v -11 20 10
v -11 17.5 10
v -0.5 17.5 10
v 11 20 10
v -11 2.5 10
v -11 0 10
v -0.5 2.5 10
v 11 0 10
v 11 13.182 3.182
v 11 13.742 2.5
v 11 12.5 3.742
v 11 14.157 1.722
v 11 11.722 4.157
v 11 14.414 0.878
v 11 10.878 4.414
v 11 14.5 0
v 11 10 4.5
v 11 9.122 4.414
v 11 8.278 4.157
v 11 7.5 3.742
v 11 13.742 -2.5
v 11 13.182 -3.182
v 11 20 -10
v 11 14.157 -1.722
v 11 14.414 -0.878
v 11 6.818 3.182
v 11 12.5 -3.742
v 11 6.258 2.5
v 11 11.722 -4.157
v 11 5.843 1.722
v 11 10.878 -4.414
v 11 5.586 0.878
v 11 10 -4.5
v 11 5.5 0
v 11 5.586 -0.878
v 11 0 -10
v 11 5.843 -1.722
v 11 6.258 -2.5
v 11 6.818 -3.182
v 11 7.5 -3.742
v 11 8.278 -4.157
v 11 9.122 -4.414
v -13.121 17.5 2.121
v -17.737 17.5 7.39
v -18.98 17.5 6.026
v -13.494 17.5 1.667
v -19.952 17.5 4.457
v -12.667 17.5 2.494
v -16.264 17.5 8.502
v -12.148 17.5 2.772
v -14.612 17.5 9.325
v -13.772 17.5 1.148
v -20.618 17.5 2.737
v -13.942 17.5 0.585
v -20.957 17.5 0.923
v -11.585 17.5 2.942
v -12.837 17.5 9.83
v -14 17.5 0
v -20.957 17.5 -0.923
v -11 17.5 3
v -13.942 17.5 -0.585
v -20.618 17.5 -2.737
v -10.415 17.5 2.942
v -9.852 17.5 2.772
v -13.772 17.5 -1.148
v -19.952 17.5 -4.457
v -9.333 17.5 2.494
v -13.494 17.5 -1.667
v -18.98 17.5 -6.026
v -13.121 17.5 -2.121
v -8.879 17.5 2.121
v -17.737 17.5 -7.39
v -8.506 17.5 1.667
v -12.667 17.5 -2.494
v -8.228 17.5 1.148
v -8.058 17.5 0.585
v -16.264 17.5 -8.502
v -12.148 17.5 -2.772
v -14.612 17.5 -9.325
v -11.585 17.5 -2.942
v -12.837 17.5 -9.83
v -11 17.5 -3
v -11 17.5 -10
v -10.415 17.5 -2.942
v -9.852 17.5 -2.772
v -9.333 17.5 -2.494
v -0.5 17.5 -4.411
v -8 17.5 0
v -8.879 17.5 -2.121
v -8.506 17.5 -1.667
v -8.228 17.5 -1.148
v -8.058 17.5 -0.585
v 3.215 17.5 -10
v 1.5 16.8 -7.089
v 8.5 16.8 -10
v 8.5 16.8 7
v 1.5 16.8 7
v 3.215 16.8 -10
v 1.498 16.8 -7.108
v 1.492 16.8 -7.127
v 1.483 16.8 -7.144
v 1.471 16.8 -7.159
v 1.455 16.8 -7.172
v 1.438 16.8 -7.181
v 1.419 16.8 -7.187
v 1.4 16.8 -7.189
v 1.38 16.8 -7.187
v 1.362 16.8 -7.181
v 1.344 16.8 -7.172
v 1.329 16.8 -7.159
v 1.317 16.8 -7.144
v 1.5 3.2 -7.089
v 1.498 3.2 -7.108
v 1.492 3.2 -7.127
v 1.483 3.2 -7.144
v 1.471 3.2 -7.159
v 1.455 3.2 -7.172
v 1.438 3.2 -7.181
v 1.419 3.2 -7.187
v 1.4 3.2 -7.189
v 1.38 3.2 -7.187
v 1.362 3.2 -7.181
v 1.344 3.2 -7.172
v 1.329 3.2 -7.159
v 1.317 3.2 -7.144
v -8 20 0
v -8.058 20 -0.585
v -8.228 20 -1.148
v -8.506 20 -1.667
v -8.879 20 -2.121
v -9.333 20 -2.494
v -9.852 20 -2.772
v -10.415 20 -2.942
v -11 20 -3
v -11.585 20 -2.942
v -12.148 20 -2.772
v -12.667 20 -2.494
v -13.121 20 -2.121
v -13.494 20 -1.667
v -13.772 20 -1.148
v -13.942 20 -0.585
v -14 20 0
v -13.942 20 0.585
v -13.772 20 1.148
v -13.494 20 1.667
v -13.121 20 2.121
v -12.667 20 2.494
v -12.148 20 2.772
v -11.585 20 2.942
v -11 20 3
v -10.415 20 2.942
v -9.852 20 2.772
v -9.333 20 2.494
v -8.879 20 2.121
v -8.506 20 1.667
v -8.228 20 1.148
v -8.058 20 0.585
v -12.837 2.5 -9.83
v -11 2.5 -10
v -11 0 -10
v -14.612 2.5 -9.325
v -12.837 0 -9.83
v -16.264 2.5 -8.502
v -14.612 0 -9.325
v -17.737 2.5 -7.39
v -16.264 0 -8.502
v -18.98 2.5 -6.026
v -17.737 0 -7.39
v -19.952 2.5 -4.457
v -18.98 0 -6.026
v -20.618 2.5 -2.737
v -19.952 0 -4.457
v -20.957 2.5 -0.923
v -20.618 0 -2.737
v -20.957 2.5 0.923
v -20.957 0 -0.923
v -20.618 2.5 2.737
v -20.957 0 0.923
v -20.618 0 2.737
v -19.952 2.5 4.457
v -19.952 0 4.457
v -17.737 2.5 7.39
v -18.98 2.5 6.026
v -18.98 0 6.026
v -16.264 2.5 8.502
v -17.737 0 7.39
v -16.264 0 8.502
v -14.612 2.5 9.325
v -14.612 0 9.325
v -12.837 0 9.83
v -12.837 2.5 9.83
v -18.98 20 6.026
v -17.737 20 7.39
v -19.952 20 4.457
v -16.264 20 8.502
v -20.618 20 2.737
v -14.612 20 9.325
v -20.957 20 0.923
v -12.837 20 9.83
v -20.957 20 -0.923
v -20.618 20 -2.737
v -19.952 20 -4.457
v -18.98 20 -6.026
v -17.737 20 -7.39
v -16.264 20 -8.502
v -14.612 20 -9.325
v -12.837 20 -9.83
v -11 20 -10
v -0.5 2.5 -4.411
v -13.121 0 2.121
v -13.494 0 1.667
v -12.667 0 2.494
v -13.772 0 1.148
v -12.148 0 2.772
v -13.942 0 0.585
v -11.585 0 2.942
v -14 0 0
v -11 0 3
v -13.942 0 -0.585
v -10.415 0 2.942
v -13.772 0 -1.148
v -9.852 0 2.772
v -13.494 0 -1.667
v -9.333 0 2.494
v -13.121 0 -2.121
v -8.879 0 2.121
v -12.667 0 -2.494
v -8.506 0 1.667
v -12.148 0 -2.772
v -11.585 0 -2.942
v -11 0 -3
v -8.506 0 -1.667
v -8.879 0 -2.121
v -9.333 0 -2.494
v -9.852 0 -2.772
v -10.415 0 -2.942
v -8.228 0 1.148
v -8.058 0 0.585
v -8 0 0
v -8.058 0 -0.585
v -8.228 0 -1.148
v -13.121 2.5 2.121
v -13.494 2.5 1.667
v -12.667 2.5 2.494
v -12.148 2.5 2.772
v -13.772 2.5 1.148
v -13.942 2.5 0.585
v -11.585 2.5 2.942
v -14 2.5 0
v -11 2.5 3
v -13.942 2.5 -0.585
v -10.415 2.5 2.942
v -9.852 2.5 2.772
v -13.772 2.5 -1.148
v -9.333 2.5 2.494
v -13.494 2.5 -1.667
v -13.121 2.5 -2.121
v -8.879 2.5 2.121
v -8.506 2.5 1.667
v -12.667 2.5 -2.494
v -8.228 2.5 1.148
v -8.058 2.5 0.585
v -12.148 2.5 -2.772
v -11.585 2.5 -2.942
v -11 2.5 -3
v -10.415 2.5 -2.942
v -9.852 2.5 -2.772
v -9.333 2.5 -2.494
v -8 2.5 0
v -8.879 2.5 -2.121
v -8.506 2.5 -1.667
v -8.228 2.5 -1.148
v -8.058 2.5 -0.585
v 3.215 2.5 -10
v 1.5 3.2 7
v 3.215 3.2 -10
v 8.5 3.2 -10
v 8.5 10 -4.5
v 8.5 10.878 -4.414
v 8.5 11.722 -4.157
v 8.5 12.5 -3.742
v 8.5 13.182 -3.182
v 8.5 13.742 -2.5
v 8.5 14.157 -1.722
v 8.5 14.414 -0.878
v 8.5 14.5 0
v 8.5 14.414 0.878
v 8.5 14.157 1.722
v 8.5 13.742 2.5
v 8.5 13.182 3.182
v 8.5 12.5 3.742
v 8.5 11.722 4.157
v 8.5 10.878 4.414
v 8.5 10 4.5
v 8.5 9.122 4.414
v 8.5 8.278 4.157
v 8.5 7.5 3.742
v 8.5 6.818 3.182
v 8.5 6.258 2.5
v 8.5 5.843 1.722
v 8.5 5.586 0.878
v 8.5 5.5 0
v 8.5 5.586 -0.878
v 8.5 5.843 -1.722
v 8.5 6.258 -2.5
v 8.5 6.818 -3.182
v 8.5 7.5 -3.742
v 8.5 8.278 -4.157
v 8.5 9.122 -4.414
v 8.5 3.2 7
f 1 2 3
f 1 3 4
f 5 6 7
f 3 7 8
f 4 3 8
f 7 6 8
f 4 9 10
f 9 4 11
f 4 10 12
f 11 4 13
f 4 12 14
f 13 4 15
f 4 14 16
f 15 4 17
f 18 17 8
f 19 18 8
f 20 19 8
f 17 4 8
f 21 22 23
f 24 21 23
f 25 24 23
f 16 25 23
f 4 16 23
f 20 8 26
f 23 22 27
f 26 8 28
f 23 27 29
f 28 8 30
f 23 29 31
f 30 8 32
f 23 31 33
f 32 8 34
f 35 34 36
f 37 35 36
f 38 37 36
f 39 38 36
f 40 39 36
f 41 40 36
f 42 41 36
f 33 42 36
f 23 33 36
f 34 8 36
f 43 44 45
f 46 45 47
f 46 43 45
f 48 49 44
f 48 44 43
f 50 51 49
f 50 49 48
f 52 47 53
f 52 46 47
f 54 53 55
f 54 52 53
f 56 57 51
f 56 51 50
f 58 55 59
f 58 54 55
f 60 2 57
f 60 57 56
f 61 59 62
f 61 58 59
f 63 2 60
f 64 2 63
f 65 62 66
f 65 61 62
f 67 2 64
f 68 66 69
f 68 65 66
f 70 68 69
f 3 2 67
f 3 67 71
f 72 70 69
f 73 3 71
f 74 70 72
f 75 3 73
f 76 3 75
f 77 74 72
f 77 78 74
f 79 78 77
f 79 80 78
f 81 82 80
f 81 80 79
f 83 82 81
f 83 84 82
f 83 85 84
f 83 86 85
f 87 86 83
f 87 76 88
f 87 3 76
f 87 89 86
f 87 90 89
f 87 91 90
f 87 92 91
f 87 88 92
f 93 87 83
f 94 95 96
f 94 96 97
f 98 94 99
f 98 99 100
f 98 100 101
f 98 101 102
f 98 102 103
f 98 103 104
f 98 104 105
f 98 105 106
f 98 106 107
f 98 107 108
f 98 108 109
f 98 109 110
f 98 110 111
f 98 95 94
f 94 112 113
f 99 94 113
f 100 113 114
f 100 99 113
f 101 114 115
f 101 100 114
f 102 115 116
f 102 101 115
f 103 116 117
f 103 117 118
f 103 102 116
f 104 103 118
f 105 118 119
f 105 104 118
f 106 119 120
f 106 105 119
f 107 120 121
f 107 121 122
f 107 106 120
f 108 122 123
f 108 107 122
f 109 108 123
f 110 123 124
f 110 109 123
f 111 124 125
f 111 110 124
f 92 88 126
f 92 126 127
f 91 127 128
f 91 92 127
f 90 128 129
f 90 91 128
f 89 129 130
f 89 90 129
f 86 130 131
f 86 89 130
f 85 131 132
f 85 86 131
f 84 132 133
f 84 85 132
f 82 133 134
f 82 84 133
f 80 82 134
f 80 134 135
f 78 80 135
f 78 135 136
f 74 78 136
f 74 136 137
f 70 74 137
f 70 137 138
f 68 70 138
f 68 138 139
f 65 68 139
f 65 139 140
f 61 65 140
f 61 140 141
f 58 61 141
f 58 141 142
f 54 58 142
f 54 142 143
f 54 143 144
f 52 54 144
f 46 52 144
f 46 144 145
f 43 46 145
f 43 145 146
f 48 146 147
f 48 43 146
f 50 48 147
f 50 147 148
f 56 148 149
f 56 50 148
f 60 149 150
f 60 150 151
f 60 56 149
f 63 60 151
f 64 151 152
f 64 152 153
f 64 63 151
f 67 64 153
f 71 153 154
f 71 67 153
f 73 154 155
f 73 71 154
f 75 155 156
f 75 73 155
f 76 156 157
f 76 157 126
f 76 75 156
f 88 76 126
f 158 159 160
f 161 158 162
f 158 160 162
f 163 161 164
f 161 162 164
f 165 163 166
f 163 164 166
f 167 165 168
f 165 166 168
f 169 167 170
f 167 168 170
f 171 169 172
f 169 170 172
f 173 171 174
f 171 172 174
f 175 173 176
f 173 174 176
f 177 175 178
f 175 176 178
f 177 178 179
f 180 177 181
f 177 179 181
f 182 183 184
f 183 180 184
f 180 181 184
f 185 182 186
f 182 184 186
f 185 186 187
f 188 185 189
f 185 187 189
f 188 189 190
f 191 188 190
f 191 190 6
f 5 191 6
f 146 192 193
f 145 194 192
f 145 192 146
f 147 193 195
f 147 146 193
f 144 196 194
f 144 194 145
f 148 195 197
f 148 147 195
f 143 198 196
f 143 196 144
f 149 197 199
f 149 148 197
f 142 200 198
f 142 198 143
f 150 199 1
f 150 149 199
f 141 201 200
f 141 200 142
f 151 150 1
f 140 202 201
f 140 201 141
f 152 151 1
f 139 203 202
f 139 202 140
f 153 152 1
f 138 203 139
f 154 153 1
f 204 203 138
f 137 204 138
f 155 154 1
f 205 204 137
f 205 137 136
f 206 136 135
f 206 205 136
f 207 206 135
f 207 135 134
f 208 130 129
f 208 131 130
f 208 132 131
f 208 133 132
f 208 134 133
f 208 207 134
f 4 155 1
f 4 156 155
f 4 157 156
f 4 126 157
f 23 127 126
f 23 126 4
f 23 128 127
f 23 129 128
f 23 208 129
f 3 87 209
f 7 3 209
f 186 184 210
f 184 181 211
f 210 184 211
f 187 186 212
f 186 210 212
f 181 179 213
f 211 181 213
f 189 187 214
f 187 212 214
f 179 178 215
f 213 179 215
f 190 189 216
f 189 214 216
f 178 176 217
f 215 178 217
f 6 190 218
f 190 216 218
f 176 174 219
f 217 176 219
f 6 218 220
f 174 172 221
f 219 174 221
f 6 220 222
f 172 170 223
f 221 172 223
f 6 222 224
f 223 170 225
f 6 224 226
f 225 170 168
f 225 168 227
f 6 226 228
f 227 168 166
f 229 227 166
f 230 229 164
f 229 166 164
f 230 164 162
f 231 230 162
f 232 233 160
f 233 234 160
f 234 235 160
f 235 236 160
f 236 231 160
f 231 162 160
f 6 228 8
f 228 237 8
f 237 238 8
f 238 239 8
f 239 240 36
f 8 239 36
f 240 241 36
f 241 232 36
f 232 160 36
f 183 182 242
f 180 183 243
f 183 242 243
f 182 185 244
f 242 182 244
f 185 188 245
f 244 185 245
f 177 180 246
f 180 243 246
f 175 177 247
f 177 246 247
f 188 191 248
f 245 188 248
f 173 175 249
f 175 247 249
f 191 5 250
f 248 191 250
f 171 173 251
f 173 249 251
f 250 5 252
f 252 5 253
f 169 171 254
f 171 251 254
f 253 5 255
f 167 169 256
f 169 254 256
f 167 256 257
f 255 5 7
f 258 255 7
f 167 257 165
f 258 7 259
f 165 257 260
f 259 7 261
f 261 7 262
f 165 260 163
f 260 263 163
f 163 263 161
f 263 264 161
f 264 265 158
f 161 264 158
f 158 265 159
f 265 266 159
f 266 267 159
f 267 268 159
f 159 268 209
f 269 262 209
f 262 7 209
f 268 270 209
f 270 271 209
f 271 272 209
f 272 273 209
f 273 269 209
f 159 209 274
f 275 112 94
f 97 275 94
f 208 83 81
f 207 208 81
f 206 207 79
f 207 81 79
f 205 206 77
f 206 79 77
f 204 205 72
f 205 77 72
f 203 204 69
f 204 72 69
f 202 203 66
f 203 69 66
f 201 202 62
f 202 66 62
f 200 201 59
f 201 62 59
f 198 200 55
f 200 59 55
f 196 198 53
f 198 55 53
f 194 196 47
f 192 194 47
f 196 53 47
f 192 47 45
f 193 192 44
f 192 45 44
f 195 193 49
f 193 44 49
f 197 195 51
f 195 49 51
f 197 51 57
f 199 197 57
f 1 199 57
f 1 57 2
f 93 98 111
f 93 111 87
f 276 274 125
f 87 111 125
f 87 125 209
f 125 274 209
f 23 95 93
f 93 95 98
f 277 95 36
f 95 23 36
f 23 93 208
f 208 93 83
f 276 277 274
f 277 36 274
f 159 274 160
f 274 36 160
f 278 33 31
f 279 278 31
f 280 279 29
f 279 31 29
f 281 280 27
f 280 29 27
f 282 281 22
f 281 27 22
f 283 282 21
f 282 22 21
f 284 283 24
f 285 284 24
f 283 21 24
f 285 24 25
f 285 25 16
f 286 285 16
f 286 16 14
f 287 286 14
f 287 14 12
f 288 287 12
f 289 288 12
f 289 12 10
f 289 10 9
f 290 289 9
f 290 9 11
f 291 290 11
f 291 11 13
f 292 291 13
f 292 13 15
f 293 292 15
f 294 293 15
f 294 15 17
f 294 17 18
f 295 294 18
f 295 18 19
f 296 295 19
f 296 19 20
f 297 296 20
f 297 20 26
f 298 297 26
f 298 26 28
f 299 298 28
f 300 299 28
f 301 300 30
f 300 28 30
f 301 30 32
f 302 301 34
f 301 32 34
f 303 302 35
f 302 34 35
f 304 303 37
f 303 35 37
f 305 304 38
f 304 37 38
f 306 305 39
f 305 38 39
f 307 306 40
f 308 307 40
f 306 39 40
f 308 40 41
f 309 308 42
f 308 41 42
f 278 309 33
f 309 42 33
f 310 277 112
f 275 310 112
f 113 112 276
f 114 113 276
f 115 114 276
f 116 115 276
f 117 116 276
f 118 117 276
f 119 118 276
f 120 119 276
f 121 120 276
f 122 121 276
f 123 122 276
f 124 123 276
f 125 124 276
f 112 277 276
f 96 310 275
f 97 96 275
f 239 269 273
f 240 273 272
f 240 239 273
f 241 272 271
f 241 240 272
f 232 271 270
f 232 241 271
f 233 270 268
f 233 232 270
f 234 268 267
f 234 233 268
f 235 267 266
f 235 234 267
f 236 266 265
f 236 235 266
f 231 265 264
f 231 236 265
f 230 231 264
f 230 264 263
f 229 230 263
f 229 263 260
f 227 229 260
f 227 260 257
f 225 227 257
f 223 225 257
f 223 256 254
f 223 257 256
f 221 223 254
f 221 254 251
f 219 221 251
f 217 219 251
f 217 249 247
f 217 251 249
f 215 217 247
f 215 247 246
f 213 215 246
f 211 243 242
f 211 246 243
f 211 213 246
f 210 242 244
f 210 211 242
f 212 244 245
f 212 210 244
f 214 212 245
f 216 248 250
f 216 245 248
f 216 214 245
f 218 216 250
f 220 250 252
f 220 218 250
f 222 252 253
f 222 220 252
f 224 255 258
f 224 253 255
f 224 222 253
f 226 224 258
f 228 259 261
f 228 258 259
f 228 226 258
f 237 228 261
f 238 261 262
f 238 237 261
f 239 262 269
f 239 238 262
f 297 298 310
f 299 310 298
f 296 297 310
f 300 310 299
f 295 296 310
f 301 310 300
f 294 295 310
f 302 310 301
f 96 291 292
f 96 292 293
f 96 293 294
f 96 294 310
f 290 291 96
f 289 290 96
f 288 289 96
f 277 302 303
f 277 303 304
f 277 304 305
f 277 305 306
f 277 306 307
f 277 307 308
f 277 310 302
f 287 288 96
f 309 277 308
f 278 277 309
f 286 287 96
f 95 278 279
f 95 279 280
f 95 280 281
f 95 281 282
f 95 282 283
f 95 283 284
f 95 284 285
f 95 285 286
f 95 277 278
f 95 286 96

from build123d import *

# Parameters (mm, degrees)
SKETCH1_R           = 3
BOSS_EXTRUDE1_DEPTH = 20
SKETCH4_W           = 7
SKETCH4_H           = 13.6
CUT_EXTRUDE3_DEPTH  = 17
CUT_EXTRUDE4_REACH  = 34
SKETCH5_R           = 4.5
SKETCH7_W           = 15
SKETCH7_H           = 20
CUT_EXTRUDE5_DEPTH  = 10.5
CUT_EXTRUDE6_START  = -2.5
CUT_EXTRUDE6_DEPTH  = 15
FILLET1_R           = 0.1


with BuildPart() as part:
    # Sketch1 → Boss-Extrude1 (new body)
    with BuildSketch(Plane(origin=(0, 0, 0), x_dir=(1, 0, 0), z_dir=(0, 1, 0))):
        with BuildLine():
            Line((-11, -10), (11, -10))
            Line((11, -10), (11, 10))
            Line((11, 10), (-11, 10))
            ThreePointArc((-11, 10), (-21, 0), (-11, -10))
        make_face()
        with Locations((-11, 0)):
            Circle(SKETCH1_R, mode=Mode.SUBTRACT)
    extrude(amount=BOSS_EXTRUDE1_DEPTH)

    # Sketch4 → Cut-Extrude3 (cut)
    with BuildSketch(Plane(origin=(0, 0, -10), x_dir=(-1, 0, 0), z_dir=(0, 0, -1))):
        with Locations((-5, 10)):
            Rectangle(SKETCH4_W, SKETCH4_H)
    extrude(amount=-CUT_EXTRUDE3_DEPTH, mode=Mode.SUBTRACT)

    # Sketch5 → Cut-Extrude4 (cut, up to next)
    with BuildSketch(Plane(origin=(11, 0, 0), x_dir=(0, 0, -1), z_dir=(1, 0, 0)), mode=Mode.PRIVATE) as cut_extrude4_sk1:
        with Locations((0, 10)):
            Circle(SKETCH5_R)
    cut_extrude4_tool1 = extrude(cut_extrude4_sk1.sketch, amount=-CUT_EXTRUDE4_REACH, mode=Mode.PRIVATE) & part.part
    add(cut_extrude4_tool1.solids().sort_by_distance((11, 10, 0))[0], mode=Mode.SUBTRACT)

    # Sketch7 → Cut-Extrude5 (cut, symmetric)
    with BuildSketch(Plane(origin=(-11, 0, 0), x_dir=(0, -1, 0), z_dir=(1, 0, 0))):
        with Locations((-10, 0)):
            Rectangle(SKETCH7_W, SKETCH7_H)
    extrude(amount=CUT_EXTRUDE5_DEPTH, both=True, mode=Mode.SUBTRACT)

    # Sketch8 → Cut-Extrude6 (cut)
    with BuildSketch(Plane.XZ.offset(CUT_EXTRUDE6_START)):
        Polygon((3.215058798, -10), (-0.5, -4.410536459), (-0.5, -10), align=None)
    extrude(amount=-CUT_EXTRUDE6_DEPTH, mode=Mode.SUBTRACT)

    # Fillet1
    fillet1_edges = [part.edges().sort_by_distance(p)[0] for p in [
        (1.5, 10, -7.419621291),
    ]]
    fillet(fillet1_edges, radius=FILLET1_R)


solid = part.part
